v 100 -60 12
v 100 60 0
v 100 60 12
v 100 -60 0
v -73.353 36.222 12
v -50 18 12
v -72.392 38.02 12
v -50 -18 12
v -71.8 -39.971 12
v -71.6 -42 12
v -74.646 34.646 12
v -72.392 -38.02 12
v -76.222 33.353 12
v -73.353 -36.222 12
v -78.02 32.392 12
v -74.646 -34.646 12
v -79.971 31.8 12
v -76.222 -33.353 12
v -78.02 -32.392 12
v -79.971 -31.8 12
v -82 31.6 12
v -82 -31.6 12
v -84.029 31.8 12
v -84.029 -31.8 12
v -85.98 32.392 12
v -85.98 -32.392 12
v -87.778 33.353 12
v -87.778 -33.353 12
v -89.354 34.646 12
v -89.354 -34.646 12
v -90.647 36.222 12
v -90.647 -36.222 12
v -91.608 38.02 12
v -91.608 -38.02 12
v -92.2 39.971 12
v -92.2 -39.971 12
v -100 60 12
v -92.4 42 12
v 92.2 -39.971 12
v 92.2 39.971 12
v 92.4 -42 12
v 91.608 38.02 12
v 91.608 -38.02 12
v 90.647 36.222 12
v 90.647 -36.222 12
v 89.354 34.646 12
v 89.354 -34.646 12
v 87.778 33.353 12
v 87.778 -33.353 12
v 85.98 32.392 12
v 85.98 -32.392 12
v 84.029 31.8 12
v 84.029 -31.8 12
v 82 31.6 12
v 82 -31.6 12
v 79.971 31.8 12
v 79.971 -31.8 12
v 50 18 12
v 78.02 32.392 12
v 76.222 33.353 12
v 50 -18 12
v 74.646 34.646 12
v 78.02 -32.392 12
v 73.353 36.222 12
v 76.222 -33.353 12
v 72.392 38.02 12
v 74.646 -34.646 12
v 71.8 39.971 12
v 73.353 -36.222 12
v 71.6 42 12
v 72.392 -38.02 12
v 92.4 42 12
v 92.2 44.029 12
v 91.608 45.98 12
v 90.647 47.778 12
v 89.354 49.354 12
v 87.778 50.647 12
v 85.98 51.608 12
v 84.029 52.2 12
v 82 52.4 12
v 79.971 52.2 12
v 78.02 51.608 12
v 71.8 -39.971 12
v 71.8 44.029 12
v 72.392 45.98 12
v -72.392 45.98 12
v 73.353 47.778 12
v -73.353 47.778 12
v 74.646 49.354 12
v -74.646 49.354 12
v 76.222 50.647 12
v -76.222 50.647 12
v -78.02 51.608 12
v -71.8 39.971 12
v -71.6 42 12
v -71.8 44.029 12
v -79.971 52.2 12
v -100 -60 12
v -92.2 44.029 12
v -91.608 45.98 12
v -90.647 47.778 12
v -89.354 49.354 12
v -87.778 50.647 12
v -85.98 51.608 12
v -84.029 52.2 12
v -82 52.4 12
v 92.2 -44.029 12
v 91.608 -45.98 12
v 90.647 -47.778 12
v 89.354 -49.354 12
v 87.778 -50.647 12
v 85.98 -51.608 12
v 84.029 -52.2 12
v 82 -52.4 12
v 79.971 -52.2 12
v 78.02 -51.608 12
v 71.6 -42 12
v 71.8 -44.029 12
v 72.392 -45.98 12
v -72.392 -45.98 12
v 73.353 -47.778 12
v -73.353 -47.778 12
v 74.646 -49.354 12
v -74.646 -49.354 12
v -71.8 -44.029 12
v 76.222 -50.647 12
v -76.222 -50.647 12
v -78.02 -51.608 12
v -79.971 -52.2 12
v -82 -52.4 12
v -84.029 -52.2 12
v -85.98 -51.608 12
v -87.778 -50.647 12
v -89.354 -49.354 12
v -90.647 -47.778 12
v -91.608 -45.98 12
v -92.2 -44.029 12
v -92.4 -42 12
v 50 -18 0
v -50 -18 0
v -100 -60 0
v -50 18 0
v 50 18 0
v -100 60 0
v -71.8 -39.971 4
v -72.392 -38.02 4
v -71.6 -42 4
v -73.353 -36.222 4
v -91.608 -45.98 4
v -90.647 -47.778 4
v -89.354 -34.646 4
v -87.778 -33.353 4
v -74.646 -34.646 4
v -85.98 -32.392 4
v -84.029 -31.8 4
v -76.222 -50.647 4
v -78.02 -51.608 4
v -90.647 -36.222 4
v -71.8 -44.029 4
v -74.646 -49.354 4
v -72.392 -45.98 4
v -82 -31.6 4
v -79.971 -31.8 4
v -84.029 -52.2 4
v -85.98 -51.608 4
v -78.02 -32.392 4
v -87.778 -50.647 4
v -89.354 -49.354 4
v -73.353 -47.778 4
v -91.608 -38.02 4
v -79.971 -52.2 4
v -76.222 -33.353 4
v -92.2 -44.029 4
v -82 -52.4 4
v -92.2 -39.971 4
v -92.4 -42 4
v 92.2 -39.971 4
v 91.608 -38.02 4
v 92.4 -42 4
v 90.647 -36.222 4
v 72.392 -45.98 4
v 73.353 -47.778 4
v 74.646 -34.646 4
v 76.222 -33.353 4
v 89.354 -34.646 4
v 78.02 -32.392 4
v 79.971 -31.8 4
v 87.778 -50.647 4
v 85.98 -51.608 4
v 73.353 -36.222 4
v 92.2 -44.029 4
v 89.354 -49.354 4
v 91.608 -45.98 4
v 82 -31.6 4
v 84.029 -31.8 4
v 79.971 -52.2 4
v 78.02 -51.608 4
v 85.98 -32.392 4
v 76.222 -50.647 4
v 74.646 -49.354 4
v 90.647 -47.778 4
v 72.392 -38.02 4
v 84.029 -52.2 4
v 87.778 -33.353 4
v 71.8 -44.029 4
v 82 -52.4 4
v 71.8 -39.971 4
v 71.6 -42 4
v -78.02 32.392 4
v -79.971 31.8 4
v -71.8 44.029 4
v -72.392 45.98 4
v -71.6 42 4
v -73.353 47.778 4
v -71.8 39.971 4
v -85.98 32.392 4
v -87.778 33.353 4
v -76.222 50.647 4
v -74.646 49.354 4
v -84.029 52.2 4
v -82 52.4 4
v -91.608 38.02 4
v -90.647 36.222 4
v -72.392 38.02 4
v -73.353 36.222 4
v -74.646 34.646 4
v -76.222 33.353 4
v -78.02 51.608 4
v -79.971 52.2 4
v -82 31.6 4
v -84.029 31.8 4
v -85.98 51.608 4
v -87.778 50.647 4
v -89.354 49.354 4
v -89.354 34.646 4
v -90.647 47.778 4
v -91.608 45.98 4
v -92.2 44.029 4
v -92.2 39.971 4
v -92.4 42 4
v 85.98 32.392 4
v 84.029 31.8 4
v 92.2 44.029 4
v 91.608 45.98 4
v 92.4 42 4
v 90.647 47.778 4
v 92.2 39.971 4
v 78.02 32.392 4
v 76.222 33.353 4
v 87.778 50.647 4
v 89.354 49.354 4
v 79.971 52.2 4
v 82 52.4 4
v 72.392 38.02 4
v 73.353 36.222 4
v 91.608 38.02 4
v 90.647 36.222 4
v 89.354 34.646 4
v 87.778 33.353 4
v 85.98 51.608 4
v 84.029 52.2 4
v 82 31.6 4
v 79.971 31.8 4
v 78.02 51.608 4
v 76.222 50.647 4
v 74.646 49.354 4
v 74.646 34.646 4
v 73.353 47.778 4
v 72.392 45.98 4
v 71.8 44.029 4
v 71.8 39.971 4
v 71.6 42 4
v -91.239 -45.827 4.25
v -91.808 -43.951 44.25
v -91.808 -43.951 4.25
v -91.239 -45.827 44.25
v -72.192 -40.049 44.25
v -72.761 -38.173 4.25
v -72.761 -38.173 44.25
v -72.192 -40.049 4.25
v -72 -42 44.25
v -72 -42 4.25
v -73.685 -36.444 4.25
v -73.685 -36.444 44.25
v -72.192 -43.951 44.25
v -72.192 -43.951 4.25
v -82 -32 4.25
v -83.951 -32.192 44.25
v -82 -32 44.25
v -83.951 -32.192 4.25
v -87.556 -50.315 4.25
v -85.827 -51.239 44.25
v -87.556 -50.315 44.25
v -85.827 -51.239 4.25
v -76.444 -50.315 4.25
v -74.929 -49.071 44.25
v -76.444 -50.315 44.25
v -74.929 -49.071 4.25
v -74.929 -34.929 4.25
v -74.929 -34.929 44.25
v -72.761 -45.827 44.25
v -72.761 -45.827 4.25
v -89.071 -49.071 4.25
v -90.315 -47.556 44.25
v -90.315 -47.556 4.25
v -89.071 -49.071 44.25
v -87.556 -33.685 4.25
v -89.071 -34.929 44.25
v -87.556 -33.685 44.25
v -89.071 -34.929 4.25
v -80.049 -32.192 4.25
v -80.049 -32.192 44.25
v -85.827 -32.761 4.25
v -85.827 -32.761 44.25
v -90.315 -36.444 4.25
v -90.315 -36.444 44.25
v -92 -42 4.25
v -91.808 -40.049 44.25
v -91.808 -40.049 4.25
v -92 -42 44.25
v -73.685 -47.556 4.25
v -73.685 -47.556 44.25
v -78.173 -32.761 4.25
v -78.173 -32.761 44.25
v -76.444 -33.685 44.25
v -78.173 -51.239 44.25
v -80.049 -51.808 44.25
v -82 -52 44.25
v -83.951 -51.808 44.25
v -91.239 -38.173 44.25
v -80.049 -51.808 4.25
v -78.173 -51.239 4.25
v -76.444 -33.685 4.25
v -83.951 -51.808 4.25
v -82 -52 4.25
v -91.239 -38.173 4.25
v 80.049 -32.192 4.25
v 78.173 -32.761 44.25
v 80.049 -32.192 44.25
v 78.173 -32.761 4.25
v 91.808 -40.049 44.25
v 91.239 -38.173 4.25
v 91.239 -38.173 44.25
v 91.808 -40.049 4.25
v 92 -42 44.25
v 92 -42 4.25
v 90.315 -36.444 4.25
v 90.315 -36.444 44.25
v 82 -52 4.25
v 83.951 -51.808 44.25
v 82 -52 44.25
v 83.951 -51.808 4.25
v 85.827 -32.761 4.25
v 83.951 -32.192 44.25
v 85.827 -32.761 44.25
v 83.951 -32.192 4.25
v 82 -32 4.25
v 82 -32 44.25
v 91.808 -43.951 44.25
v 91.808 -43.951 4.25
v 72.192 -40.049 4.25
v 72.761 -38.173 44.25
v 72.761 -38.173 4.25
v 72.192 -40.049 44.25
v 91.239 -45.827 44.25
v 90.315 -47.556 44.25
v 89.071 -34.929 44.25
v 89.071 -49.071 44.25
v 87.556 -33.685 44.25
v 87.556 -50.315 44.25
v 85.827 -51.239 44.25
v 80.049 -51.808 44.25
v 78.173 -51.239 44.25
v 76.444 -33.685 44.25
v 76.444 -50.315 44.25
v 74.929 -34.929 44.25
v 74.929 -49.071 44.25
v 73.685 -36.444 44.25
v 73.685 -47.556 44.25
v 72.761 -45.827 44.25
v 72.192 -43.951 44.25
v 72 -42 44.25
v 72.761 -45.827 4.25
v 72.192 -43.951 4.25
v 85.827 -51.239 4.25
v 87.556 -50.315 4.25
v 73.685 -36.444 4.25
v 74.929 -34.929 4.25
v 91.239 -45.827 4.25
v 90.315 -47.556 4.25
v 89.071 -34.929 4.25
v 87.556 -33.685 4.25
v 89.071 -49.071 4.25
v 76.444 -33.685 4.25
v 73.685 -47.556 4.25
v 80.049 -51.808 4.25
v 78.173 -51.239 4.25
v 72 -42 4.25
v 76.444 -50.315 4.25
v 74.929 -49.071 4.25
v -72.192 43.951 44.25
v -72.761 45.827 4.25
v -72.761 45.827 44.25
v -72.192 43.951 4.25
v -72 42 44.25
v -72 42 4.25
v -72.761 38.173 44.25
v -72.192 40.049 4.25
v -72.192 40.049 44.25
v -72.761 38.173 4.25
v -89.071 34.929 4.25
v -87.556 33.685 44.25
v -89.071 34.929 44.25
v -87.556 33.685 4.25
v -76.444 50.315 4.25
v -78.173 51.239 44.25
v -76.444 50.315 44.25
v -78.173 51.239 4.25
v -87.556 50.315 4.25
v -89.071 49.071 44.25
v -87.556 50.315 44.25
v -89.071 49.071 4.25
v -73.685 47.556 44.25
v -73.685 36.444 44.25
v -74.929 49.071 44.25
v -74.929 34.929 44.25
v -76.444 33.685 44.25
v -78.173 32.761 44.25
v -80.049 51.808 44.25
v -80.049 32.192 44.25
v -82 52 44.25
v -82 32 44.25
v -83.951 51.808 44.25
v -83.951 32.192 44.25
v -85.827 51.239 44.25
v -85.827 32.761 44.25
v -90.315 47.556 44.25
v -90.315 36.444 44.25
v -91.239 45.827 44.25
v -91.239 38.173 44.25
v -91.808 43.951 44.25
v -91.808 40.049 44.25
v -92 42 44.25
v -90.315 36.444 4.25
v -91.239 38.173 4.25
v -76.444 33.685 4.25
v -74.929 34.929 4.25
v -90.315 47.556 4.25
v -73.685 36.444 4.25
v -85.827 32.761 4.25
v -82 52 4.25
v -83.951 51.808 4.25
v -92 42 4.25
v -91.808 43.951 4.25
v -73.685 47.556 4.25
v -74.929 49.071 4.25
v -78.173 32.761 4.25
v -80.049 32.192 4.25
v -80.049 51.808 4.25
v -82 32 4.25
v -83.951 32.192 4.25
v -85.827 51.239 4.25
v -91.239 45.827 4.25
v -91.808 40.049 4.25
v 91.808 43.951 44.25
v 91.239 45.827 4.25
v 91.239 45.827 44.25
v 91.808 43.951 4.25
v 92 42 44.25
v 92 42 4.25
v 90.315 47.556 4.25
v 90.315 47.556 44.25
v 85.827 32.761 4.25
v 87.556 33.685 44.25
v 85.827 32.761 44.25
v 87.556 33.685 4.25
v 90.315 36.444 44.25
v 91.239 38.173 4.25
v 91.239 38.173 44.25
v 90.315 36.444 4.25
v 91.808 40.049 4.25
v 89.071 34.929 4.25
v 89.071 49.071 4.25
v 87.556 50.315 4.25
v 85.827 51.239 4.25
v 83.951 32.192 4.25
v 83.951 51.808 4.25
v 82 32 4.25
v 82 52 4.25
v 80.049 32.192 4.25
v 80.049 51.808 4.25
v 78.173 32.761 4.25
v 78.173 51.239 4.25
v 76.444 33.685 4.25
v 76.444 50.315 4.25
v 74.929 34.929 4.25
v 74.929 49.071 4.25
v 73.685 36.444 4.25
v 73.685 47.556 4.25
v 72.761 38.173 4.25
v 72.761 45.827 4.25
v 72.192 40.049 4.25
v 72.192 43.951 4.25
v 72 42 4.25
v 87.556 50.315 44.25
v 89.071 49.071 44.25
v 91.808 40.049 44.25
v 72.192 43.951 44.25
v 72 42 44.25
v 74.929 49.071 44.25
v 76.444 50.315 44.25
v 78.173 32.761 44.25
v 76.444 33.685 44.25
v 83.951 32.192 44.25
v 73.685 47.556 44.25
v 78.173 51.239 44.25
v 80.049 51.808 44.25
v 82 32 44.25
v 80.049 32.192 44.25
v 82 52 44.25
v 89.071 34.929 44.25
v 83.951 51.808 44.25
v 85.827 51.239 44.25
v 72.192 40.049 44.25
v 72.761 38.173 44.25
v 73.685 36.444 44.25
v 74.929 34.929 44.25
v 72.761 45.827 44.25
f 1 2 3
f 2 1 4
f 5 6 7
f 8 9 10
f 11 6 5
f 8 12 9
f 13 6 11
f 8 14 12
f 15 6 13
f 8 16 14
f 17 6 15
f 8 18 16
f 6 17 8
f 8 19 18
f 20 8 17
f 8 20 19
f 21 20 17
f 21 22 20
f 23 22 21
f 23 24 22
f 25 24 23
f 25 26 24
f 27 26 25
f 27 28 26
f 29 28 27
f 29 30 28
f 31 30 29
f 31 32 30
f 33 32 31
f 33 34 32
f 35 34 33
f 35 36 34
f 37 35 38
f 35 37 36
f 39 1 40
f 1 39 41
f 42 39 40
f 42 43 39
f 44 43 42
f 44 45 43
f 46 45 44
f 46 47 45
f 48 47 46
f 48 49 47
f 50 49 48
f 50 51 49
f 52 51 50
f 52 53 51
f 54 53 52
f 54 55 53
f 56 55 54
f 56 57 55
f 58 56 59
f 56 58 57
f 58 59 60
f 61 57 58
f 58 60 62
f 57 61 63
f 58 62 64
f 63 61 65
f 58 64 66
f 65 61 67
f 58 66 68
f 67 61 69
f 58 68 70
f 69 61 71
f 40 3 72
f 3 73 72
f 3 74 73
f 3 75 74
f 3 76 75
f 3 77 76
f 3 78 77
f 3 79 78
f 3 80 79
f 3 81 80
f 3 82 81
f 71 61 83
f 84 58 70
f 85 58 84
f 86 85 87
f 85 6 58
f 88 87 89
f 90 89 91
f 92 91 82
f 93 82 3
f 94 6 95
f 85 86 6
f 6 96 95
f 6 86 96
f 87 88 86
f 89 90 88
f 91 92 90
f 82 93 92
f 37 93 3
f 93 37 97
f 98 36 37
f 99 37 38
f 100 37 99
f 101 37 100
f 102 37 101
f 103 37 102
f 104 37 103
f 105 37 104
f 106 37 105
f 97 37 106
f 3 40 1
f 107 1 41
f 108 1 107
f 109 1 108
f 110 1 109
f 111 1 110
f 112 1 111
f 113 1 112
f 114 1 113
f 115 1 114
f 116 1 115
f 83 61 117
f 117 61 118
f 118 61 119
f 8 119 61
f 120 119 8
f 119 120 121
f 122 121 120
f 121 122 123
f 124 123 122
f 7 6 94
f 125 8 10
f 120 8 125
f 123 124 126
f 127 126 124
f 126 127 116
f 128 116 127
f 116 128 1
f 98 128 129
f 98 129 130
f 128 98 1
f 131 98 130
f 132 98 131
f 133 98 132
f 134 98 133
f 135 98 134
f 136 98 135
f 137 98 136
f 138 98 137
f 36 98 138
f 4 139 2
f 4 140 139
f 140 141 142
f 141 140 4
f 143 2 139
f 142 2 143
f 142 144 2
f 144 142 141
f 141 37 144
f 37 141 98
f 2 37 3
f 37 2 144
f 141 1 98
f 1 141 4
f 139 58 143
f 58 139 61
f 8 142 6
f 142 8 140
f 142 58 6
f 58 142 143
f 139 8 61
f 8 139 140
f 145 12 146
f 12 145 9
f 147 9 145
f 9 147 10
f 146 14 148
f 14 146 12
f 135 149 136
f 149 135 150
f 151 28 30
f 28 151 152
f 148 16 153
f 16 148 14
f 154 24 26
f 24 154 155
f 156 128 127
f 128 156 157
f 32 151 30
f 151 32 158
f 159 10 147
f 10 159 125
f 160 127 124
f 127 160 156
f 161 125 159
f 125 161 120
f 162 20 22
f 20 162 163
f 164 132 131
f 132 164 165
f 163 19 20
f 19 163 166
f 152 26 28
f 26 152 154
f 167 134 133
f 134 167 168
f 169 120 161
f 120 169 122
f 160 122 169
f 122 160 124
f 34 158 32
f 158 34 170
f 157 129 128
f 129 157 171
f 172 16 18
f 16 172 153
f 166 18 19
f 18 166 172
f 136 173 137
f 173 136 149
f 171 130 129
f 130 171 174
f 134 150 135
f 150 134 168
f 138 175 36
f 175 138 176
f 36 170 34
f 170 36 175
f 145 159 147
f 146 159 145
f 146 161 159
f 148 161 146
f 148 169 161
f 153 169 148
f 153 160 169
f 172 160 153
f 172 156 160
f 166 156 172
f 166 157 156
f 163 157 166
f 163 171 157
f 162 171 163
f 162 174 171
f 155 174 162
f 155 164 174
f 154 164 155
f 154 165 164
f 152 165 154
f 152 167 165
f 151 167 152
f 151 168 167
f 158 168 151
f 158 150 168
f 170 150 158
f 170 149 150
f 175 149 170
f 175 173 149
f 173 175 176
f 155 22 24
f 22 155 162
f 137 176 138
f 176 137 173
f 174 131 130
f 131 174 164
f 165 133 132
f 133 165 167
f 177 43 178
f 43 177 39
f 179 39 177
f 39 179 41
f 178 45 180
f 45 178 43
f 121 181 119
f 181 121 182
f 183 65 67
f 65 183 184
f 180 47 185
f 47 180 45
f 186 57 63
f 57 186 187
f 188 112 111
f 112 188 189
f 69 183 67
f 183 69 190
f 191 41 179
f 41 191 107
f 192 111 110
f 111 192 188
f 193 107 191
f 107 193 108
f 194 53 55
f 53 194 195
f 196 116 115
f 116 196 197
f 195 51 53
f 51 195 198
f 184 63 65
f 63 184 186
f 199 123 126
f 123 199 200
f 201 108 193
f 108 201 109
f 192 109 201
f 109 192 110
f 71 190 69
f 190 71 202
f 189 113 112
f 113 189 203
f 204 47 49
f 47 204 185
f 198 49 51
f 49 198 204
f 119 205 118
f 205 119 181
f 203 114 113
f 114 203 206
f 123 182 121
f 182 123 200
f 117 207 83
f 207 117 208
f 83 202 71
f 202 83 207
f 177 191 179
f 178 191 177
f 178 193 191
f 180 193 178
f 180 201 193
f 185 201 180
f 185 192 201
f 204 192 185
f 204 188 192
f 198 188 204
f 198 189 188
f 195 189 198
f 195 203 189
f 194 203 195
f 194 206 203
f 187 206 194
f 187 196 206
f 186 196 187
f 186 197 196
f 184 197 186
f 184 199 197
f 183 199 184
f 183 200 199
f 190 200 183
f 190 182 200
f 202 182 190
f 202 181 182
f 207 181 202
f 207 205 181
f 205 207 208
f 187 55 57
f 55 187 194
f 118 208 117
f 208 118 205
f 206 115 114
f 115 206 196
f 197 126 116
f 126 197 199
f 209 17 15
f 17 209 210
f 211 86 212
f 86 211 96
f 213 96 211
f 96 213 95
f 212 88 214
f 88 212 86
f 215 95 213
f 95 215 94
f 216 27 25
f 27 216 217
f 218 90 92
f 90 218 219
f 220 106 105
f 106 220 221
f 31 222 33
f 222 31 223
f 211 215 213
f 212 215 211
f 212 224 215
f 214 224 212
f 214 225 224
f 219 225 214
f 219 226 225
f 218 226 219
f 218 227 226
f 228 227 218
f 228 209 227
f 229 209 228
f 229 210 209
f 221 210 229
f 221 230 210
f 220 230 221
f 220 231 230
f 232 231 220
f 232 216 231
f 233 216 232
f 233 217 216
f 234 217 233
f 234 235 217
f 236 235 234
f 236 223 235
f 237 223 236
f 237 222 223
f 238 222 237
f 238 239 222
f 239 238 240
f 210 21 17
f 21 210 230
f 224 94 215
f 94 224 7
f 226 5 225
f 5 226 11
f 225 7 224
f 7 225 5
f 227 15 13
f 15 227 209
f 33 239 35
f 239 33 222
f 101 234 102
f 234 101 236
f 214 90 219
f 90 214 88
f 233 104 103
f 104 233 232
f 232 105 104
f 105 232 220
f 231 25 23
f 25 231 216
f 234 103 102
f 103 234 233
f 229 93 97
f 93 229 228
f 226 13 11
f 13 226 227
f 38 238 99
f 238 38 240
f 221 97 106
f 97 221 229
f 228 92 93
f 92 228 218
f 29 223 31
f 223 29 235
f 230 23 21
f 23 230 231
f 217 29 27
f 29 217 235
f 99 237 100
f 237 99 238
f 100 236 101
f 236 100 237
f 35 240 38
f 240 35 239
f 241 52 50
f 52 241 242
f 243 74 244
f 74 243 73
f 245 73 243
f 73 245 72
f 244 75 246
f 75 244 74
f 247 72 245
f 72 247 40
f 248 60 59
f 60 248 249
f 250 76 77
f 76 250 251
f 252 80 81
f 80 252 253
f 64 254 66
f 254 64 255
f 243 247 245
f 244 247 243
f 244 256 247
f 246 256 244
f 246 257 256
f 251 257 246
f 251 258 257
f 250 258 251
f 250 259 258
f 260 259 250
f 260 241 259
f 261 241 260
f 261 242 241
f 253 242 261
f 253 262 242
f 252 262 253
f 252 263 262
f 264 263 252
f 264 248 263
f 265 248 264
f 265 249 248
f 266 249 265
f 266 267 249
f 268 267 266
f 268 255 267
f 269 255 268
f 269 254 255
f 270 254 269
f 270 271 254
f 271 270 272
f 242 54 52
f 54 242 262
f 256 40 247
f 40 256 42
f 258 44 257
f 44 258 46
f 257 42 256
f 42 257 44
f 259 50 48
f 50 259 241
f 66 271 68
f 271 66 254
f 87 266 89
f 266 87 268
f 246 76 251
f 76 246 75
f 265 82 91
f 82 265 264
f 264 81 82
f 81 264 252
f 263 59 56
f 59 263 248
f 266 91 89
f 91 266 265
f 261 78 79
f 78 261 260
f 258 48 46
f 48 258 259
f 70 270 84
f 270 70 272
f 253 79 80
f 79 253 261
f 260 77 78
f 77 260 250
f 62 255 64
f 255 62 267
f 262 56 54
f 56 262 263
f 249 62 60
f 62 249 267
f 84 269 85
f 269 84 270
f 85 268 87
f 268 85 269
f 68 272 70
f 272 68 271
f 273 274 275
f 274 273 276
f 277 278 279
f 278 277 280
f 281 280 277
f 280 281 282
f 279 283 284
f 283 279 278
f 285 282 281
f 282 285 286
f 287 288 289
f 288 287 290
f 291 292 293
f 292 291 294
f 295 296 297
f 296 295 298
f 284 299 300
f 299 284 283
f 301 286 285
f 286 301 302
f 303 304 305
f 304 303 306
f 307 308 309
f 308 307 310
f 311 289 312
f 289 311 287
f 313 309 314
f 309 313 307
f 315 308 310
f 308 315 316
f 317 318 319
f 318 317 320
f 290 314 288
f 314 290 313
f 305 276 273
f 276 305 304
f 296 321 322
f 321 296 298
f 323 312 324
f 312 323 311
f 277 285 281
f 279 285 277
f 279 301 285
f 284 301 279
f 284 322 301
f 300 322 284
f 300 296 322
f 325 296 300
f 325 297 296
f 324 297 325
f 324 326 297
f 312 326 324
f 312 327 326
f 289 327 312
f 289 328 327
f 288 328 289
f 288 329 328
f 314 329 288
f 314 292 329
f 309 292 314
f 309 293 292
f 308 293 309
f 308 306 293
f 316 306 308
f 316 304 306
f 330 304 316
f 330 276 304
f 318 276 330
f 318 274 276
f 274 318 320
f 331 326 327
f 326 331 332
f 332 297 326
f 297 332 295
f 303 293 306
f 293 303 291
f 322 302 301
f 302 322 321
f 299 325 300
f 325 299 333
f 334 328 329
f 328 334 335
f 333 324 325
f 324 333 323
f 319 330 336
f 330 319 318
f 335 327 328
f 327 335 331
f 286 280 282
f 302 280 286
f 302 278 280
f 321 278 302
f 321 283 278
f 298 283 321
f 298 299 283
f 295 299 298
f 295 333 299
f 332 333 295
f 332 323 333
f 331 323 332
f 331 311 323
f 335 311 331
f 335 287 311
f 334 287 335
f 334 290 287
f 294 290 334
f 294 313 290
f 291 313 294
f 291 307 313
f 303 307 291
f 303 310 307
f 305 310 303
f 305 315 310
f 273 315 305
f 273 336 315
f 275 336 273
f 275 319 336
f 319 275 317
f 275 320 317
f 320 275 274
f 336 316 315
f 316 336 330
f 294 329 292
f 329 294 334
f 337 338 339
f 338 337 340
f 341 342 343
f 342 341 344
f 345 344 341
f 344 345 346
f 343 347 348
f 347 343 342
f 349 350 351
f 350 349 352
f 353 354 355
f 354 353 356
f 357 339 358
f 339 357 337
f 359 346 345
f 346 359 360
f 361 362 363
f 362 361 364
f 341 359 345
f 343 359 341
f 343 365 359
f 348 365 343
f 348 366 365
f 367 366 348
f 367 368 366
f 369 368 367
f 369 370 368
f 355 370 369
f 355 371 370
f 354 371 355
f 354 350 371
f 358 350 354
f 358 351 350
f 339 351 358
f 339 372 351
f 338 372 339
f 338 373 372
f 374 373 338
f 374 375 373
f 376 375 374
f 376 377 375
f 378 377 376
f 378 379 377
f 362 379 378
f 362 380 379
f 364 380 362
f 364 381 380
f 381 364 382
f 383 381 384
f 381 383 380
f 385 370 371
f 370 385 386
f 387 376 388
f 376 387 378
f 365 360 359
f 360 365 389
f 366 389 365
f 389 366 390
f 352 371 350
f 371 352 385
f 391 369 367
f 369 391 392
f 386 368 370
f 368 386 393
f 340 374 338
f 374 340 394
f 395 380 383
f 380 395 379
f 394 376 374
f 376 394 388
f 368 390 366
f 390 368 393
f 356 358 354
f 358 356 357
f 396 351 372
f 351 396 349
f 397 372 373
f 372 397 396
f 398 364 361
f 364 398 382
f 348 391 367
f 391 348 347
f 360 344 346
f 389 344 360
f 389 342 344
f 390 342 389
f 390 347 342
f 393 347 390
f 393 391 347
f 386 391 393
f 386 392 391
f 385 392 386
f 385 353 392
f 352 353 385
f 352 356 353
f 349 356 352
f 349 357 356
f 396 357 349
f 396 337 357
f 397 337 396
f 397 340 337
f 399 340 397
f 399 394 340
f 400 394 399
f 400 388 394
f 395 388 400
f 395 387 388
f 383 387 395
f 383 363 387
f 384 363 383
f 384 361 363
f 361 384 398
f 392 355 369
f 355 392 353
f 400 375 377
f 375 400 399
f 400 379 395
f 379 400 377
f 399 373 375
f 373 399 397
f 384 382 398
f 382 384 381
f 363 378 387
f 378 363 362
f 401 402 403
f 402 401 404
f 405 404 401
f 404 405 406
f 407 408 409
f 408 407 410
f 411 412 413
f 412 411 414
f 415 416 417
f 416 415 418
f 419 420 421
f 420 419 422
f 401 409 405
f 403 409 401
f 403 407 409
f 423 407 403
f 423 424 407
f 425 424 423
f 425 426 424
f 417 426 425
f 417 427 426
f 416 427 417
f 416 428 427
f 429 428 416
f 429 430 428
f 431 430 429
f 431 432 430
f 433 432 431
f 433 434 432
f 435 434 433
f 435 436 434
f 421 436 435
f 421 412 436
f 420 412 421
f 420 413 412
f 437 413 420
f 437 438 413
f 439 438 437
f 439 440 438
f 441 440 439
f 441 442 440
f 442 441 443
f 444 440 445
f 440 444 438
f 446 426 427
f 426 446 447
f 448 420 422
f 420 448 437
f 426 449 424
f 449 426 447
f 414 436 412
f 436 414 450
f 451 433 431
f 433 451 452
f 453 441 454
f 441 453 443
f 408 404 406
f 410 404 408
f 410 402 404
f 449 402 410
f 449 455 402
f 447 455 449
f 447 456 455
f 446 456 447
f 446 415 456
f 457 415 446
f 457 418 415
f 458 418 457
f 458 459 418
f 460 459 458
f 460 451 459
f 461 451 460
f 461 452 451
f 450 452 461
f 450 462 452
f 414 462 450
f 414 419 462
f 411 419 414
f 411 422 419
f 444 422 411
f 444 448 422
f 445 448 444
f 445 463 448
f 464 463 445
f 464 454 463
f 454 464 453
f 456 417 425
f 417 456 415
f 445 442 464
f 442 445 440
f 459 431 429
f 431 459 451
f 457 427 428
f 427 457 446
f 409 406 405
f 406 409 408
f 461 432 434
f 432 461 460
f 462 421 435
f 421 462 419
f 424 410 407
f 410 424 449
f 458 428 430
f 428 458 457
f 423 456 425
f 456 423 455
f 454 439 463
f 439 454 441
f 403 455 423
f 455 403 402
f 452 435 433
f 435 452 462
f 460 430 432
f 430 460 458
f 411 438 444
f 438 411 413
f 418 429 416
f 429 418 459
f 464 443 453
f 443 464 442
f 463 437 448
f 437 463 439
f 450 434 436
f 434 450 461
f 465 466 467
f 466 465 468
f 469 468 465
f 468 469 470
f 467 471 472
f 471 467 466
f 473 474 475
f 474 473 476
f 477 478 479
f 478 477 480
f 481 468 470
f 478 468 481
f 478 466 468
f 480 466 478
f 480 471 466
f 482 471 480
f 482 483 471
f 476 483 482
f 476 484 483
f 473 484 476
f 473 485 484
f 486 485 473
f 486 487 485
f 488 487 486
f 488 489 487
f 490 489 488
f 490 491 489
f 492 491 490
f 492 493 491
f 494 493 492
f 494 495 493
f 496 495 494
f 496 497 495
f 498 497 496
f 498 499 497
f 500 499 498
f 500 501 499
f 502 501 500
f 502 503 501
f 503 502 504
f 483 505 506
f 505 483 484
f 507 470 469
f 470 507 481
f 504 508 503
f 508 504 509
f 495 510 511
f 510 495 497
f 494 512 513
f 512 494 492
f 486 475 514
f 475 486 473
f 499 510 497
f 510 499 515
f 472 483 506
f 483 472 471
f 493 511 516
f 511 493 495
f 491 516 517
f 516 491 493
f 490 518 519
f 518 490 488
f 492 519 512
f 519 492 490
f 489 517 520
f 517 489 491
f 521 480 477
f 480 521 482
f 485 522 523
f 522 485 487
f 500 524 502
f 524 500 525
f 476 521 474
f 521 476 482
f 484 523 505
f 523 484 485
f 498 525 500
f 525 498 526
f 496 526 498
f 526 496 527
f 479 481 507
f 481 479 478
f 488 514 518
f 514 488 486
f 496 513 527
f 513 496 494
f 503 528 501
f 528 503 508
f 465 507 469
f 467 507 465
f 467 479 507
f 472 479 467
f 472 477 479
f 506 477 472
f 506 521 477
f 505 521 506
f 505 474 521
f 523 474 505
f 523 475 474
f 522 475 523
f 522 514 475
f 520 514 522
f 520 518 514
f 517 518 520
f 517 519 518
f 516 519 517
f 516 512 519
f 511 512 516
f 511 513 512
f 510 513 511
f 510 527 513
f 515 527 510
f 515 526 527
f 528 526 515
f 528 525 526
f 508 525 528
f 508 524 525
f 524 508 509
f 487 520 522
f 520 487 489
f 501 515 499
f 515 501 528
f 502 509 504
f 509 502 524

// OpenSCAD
$fn = 32;

// ------------------------------------------------------------------------
// Frame with four posts: 200 x 120 mm frame, four d20 posts
// Every part is its own module, assembly() places them once.
// ------------------------------------------------------------------------

// --- part 1 ---
module base_frame() {
  difference() {
    translate([-100, -60, 0]) cube([200, 120, 12]);
    translate([-50, -18, -1]) cube([100, 36, 14]);
    translate([-82, -42, 4]) cylinder(h = 9, d = 20.8);
    translate([82, -42, 4]) cylinder(h = 9, d = 20.8);
    translate([-82, 42, 4]) cylinder(h = 9, d = 20.8);
    translate([82, 42, 4]) cylinder(h = 9, d = 20.8);
  }
}

// --- part 2 ---
module post1() {
  cylinder(h = 40, d = 20);
}

// --- part 3 ---
module post2() {
  cylinder(h = 40, d = 20);
}

// --- part 4 ---
module post3() {
  cylinder(h = 40, d = 20);
}

// --- part 5 ---
module post4() {
  cylinder(h = 40, d = 20);
}

// --- assembly ---
module assembly() {
  translate([0, 0, 0]) rotate([0, 0, 0]) base_frame();
  translate([-82, -42, 4.25]) rotate([0, 0, 0]) post1();
  translate([82, -42, 4.25]) rotate([0, 0, 0]) post2();
  translate([-82, 42, 4.25]) rotate([0, 0, 0]) post3();
  translate([82, 42, 4.25]) rotate([0, 0, 0]) post4();
}

assembly();
